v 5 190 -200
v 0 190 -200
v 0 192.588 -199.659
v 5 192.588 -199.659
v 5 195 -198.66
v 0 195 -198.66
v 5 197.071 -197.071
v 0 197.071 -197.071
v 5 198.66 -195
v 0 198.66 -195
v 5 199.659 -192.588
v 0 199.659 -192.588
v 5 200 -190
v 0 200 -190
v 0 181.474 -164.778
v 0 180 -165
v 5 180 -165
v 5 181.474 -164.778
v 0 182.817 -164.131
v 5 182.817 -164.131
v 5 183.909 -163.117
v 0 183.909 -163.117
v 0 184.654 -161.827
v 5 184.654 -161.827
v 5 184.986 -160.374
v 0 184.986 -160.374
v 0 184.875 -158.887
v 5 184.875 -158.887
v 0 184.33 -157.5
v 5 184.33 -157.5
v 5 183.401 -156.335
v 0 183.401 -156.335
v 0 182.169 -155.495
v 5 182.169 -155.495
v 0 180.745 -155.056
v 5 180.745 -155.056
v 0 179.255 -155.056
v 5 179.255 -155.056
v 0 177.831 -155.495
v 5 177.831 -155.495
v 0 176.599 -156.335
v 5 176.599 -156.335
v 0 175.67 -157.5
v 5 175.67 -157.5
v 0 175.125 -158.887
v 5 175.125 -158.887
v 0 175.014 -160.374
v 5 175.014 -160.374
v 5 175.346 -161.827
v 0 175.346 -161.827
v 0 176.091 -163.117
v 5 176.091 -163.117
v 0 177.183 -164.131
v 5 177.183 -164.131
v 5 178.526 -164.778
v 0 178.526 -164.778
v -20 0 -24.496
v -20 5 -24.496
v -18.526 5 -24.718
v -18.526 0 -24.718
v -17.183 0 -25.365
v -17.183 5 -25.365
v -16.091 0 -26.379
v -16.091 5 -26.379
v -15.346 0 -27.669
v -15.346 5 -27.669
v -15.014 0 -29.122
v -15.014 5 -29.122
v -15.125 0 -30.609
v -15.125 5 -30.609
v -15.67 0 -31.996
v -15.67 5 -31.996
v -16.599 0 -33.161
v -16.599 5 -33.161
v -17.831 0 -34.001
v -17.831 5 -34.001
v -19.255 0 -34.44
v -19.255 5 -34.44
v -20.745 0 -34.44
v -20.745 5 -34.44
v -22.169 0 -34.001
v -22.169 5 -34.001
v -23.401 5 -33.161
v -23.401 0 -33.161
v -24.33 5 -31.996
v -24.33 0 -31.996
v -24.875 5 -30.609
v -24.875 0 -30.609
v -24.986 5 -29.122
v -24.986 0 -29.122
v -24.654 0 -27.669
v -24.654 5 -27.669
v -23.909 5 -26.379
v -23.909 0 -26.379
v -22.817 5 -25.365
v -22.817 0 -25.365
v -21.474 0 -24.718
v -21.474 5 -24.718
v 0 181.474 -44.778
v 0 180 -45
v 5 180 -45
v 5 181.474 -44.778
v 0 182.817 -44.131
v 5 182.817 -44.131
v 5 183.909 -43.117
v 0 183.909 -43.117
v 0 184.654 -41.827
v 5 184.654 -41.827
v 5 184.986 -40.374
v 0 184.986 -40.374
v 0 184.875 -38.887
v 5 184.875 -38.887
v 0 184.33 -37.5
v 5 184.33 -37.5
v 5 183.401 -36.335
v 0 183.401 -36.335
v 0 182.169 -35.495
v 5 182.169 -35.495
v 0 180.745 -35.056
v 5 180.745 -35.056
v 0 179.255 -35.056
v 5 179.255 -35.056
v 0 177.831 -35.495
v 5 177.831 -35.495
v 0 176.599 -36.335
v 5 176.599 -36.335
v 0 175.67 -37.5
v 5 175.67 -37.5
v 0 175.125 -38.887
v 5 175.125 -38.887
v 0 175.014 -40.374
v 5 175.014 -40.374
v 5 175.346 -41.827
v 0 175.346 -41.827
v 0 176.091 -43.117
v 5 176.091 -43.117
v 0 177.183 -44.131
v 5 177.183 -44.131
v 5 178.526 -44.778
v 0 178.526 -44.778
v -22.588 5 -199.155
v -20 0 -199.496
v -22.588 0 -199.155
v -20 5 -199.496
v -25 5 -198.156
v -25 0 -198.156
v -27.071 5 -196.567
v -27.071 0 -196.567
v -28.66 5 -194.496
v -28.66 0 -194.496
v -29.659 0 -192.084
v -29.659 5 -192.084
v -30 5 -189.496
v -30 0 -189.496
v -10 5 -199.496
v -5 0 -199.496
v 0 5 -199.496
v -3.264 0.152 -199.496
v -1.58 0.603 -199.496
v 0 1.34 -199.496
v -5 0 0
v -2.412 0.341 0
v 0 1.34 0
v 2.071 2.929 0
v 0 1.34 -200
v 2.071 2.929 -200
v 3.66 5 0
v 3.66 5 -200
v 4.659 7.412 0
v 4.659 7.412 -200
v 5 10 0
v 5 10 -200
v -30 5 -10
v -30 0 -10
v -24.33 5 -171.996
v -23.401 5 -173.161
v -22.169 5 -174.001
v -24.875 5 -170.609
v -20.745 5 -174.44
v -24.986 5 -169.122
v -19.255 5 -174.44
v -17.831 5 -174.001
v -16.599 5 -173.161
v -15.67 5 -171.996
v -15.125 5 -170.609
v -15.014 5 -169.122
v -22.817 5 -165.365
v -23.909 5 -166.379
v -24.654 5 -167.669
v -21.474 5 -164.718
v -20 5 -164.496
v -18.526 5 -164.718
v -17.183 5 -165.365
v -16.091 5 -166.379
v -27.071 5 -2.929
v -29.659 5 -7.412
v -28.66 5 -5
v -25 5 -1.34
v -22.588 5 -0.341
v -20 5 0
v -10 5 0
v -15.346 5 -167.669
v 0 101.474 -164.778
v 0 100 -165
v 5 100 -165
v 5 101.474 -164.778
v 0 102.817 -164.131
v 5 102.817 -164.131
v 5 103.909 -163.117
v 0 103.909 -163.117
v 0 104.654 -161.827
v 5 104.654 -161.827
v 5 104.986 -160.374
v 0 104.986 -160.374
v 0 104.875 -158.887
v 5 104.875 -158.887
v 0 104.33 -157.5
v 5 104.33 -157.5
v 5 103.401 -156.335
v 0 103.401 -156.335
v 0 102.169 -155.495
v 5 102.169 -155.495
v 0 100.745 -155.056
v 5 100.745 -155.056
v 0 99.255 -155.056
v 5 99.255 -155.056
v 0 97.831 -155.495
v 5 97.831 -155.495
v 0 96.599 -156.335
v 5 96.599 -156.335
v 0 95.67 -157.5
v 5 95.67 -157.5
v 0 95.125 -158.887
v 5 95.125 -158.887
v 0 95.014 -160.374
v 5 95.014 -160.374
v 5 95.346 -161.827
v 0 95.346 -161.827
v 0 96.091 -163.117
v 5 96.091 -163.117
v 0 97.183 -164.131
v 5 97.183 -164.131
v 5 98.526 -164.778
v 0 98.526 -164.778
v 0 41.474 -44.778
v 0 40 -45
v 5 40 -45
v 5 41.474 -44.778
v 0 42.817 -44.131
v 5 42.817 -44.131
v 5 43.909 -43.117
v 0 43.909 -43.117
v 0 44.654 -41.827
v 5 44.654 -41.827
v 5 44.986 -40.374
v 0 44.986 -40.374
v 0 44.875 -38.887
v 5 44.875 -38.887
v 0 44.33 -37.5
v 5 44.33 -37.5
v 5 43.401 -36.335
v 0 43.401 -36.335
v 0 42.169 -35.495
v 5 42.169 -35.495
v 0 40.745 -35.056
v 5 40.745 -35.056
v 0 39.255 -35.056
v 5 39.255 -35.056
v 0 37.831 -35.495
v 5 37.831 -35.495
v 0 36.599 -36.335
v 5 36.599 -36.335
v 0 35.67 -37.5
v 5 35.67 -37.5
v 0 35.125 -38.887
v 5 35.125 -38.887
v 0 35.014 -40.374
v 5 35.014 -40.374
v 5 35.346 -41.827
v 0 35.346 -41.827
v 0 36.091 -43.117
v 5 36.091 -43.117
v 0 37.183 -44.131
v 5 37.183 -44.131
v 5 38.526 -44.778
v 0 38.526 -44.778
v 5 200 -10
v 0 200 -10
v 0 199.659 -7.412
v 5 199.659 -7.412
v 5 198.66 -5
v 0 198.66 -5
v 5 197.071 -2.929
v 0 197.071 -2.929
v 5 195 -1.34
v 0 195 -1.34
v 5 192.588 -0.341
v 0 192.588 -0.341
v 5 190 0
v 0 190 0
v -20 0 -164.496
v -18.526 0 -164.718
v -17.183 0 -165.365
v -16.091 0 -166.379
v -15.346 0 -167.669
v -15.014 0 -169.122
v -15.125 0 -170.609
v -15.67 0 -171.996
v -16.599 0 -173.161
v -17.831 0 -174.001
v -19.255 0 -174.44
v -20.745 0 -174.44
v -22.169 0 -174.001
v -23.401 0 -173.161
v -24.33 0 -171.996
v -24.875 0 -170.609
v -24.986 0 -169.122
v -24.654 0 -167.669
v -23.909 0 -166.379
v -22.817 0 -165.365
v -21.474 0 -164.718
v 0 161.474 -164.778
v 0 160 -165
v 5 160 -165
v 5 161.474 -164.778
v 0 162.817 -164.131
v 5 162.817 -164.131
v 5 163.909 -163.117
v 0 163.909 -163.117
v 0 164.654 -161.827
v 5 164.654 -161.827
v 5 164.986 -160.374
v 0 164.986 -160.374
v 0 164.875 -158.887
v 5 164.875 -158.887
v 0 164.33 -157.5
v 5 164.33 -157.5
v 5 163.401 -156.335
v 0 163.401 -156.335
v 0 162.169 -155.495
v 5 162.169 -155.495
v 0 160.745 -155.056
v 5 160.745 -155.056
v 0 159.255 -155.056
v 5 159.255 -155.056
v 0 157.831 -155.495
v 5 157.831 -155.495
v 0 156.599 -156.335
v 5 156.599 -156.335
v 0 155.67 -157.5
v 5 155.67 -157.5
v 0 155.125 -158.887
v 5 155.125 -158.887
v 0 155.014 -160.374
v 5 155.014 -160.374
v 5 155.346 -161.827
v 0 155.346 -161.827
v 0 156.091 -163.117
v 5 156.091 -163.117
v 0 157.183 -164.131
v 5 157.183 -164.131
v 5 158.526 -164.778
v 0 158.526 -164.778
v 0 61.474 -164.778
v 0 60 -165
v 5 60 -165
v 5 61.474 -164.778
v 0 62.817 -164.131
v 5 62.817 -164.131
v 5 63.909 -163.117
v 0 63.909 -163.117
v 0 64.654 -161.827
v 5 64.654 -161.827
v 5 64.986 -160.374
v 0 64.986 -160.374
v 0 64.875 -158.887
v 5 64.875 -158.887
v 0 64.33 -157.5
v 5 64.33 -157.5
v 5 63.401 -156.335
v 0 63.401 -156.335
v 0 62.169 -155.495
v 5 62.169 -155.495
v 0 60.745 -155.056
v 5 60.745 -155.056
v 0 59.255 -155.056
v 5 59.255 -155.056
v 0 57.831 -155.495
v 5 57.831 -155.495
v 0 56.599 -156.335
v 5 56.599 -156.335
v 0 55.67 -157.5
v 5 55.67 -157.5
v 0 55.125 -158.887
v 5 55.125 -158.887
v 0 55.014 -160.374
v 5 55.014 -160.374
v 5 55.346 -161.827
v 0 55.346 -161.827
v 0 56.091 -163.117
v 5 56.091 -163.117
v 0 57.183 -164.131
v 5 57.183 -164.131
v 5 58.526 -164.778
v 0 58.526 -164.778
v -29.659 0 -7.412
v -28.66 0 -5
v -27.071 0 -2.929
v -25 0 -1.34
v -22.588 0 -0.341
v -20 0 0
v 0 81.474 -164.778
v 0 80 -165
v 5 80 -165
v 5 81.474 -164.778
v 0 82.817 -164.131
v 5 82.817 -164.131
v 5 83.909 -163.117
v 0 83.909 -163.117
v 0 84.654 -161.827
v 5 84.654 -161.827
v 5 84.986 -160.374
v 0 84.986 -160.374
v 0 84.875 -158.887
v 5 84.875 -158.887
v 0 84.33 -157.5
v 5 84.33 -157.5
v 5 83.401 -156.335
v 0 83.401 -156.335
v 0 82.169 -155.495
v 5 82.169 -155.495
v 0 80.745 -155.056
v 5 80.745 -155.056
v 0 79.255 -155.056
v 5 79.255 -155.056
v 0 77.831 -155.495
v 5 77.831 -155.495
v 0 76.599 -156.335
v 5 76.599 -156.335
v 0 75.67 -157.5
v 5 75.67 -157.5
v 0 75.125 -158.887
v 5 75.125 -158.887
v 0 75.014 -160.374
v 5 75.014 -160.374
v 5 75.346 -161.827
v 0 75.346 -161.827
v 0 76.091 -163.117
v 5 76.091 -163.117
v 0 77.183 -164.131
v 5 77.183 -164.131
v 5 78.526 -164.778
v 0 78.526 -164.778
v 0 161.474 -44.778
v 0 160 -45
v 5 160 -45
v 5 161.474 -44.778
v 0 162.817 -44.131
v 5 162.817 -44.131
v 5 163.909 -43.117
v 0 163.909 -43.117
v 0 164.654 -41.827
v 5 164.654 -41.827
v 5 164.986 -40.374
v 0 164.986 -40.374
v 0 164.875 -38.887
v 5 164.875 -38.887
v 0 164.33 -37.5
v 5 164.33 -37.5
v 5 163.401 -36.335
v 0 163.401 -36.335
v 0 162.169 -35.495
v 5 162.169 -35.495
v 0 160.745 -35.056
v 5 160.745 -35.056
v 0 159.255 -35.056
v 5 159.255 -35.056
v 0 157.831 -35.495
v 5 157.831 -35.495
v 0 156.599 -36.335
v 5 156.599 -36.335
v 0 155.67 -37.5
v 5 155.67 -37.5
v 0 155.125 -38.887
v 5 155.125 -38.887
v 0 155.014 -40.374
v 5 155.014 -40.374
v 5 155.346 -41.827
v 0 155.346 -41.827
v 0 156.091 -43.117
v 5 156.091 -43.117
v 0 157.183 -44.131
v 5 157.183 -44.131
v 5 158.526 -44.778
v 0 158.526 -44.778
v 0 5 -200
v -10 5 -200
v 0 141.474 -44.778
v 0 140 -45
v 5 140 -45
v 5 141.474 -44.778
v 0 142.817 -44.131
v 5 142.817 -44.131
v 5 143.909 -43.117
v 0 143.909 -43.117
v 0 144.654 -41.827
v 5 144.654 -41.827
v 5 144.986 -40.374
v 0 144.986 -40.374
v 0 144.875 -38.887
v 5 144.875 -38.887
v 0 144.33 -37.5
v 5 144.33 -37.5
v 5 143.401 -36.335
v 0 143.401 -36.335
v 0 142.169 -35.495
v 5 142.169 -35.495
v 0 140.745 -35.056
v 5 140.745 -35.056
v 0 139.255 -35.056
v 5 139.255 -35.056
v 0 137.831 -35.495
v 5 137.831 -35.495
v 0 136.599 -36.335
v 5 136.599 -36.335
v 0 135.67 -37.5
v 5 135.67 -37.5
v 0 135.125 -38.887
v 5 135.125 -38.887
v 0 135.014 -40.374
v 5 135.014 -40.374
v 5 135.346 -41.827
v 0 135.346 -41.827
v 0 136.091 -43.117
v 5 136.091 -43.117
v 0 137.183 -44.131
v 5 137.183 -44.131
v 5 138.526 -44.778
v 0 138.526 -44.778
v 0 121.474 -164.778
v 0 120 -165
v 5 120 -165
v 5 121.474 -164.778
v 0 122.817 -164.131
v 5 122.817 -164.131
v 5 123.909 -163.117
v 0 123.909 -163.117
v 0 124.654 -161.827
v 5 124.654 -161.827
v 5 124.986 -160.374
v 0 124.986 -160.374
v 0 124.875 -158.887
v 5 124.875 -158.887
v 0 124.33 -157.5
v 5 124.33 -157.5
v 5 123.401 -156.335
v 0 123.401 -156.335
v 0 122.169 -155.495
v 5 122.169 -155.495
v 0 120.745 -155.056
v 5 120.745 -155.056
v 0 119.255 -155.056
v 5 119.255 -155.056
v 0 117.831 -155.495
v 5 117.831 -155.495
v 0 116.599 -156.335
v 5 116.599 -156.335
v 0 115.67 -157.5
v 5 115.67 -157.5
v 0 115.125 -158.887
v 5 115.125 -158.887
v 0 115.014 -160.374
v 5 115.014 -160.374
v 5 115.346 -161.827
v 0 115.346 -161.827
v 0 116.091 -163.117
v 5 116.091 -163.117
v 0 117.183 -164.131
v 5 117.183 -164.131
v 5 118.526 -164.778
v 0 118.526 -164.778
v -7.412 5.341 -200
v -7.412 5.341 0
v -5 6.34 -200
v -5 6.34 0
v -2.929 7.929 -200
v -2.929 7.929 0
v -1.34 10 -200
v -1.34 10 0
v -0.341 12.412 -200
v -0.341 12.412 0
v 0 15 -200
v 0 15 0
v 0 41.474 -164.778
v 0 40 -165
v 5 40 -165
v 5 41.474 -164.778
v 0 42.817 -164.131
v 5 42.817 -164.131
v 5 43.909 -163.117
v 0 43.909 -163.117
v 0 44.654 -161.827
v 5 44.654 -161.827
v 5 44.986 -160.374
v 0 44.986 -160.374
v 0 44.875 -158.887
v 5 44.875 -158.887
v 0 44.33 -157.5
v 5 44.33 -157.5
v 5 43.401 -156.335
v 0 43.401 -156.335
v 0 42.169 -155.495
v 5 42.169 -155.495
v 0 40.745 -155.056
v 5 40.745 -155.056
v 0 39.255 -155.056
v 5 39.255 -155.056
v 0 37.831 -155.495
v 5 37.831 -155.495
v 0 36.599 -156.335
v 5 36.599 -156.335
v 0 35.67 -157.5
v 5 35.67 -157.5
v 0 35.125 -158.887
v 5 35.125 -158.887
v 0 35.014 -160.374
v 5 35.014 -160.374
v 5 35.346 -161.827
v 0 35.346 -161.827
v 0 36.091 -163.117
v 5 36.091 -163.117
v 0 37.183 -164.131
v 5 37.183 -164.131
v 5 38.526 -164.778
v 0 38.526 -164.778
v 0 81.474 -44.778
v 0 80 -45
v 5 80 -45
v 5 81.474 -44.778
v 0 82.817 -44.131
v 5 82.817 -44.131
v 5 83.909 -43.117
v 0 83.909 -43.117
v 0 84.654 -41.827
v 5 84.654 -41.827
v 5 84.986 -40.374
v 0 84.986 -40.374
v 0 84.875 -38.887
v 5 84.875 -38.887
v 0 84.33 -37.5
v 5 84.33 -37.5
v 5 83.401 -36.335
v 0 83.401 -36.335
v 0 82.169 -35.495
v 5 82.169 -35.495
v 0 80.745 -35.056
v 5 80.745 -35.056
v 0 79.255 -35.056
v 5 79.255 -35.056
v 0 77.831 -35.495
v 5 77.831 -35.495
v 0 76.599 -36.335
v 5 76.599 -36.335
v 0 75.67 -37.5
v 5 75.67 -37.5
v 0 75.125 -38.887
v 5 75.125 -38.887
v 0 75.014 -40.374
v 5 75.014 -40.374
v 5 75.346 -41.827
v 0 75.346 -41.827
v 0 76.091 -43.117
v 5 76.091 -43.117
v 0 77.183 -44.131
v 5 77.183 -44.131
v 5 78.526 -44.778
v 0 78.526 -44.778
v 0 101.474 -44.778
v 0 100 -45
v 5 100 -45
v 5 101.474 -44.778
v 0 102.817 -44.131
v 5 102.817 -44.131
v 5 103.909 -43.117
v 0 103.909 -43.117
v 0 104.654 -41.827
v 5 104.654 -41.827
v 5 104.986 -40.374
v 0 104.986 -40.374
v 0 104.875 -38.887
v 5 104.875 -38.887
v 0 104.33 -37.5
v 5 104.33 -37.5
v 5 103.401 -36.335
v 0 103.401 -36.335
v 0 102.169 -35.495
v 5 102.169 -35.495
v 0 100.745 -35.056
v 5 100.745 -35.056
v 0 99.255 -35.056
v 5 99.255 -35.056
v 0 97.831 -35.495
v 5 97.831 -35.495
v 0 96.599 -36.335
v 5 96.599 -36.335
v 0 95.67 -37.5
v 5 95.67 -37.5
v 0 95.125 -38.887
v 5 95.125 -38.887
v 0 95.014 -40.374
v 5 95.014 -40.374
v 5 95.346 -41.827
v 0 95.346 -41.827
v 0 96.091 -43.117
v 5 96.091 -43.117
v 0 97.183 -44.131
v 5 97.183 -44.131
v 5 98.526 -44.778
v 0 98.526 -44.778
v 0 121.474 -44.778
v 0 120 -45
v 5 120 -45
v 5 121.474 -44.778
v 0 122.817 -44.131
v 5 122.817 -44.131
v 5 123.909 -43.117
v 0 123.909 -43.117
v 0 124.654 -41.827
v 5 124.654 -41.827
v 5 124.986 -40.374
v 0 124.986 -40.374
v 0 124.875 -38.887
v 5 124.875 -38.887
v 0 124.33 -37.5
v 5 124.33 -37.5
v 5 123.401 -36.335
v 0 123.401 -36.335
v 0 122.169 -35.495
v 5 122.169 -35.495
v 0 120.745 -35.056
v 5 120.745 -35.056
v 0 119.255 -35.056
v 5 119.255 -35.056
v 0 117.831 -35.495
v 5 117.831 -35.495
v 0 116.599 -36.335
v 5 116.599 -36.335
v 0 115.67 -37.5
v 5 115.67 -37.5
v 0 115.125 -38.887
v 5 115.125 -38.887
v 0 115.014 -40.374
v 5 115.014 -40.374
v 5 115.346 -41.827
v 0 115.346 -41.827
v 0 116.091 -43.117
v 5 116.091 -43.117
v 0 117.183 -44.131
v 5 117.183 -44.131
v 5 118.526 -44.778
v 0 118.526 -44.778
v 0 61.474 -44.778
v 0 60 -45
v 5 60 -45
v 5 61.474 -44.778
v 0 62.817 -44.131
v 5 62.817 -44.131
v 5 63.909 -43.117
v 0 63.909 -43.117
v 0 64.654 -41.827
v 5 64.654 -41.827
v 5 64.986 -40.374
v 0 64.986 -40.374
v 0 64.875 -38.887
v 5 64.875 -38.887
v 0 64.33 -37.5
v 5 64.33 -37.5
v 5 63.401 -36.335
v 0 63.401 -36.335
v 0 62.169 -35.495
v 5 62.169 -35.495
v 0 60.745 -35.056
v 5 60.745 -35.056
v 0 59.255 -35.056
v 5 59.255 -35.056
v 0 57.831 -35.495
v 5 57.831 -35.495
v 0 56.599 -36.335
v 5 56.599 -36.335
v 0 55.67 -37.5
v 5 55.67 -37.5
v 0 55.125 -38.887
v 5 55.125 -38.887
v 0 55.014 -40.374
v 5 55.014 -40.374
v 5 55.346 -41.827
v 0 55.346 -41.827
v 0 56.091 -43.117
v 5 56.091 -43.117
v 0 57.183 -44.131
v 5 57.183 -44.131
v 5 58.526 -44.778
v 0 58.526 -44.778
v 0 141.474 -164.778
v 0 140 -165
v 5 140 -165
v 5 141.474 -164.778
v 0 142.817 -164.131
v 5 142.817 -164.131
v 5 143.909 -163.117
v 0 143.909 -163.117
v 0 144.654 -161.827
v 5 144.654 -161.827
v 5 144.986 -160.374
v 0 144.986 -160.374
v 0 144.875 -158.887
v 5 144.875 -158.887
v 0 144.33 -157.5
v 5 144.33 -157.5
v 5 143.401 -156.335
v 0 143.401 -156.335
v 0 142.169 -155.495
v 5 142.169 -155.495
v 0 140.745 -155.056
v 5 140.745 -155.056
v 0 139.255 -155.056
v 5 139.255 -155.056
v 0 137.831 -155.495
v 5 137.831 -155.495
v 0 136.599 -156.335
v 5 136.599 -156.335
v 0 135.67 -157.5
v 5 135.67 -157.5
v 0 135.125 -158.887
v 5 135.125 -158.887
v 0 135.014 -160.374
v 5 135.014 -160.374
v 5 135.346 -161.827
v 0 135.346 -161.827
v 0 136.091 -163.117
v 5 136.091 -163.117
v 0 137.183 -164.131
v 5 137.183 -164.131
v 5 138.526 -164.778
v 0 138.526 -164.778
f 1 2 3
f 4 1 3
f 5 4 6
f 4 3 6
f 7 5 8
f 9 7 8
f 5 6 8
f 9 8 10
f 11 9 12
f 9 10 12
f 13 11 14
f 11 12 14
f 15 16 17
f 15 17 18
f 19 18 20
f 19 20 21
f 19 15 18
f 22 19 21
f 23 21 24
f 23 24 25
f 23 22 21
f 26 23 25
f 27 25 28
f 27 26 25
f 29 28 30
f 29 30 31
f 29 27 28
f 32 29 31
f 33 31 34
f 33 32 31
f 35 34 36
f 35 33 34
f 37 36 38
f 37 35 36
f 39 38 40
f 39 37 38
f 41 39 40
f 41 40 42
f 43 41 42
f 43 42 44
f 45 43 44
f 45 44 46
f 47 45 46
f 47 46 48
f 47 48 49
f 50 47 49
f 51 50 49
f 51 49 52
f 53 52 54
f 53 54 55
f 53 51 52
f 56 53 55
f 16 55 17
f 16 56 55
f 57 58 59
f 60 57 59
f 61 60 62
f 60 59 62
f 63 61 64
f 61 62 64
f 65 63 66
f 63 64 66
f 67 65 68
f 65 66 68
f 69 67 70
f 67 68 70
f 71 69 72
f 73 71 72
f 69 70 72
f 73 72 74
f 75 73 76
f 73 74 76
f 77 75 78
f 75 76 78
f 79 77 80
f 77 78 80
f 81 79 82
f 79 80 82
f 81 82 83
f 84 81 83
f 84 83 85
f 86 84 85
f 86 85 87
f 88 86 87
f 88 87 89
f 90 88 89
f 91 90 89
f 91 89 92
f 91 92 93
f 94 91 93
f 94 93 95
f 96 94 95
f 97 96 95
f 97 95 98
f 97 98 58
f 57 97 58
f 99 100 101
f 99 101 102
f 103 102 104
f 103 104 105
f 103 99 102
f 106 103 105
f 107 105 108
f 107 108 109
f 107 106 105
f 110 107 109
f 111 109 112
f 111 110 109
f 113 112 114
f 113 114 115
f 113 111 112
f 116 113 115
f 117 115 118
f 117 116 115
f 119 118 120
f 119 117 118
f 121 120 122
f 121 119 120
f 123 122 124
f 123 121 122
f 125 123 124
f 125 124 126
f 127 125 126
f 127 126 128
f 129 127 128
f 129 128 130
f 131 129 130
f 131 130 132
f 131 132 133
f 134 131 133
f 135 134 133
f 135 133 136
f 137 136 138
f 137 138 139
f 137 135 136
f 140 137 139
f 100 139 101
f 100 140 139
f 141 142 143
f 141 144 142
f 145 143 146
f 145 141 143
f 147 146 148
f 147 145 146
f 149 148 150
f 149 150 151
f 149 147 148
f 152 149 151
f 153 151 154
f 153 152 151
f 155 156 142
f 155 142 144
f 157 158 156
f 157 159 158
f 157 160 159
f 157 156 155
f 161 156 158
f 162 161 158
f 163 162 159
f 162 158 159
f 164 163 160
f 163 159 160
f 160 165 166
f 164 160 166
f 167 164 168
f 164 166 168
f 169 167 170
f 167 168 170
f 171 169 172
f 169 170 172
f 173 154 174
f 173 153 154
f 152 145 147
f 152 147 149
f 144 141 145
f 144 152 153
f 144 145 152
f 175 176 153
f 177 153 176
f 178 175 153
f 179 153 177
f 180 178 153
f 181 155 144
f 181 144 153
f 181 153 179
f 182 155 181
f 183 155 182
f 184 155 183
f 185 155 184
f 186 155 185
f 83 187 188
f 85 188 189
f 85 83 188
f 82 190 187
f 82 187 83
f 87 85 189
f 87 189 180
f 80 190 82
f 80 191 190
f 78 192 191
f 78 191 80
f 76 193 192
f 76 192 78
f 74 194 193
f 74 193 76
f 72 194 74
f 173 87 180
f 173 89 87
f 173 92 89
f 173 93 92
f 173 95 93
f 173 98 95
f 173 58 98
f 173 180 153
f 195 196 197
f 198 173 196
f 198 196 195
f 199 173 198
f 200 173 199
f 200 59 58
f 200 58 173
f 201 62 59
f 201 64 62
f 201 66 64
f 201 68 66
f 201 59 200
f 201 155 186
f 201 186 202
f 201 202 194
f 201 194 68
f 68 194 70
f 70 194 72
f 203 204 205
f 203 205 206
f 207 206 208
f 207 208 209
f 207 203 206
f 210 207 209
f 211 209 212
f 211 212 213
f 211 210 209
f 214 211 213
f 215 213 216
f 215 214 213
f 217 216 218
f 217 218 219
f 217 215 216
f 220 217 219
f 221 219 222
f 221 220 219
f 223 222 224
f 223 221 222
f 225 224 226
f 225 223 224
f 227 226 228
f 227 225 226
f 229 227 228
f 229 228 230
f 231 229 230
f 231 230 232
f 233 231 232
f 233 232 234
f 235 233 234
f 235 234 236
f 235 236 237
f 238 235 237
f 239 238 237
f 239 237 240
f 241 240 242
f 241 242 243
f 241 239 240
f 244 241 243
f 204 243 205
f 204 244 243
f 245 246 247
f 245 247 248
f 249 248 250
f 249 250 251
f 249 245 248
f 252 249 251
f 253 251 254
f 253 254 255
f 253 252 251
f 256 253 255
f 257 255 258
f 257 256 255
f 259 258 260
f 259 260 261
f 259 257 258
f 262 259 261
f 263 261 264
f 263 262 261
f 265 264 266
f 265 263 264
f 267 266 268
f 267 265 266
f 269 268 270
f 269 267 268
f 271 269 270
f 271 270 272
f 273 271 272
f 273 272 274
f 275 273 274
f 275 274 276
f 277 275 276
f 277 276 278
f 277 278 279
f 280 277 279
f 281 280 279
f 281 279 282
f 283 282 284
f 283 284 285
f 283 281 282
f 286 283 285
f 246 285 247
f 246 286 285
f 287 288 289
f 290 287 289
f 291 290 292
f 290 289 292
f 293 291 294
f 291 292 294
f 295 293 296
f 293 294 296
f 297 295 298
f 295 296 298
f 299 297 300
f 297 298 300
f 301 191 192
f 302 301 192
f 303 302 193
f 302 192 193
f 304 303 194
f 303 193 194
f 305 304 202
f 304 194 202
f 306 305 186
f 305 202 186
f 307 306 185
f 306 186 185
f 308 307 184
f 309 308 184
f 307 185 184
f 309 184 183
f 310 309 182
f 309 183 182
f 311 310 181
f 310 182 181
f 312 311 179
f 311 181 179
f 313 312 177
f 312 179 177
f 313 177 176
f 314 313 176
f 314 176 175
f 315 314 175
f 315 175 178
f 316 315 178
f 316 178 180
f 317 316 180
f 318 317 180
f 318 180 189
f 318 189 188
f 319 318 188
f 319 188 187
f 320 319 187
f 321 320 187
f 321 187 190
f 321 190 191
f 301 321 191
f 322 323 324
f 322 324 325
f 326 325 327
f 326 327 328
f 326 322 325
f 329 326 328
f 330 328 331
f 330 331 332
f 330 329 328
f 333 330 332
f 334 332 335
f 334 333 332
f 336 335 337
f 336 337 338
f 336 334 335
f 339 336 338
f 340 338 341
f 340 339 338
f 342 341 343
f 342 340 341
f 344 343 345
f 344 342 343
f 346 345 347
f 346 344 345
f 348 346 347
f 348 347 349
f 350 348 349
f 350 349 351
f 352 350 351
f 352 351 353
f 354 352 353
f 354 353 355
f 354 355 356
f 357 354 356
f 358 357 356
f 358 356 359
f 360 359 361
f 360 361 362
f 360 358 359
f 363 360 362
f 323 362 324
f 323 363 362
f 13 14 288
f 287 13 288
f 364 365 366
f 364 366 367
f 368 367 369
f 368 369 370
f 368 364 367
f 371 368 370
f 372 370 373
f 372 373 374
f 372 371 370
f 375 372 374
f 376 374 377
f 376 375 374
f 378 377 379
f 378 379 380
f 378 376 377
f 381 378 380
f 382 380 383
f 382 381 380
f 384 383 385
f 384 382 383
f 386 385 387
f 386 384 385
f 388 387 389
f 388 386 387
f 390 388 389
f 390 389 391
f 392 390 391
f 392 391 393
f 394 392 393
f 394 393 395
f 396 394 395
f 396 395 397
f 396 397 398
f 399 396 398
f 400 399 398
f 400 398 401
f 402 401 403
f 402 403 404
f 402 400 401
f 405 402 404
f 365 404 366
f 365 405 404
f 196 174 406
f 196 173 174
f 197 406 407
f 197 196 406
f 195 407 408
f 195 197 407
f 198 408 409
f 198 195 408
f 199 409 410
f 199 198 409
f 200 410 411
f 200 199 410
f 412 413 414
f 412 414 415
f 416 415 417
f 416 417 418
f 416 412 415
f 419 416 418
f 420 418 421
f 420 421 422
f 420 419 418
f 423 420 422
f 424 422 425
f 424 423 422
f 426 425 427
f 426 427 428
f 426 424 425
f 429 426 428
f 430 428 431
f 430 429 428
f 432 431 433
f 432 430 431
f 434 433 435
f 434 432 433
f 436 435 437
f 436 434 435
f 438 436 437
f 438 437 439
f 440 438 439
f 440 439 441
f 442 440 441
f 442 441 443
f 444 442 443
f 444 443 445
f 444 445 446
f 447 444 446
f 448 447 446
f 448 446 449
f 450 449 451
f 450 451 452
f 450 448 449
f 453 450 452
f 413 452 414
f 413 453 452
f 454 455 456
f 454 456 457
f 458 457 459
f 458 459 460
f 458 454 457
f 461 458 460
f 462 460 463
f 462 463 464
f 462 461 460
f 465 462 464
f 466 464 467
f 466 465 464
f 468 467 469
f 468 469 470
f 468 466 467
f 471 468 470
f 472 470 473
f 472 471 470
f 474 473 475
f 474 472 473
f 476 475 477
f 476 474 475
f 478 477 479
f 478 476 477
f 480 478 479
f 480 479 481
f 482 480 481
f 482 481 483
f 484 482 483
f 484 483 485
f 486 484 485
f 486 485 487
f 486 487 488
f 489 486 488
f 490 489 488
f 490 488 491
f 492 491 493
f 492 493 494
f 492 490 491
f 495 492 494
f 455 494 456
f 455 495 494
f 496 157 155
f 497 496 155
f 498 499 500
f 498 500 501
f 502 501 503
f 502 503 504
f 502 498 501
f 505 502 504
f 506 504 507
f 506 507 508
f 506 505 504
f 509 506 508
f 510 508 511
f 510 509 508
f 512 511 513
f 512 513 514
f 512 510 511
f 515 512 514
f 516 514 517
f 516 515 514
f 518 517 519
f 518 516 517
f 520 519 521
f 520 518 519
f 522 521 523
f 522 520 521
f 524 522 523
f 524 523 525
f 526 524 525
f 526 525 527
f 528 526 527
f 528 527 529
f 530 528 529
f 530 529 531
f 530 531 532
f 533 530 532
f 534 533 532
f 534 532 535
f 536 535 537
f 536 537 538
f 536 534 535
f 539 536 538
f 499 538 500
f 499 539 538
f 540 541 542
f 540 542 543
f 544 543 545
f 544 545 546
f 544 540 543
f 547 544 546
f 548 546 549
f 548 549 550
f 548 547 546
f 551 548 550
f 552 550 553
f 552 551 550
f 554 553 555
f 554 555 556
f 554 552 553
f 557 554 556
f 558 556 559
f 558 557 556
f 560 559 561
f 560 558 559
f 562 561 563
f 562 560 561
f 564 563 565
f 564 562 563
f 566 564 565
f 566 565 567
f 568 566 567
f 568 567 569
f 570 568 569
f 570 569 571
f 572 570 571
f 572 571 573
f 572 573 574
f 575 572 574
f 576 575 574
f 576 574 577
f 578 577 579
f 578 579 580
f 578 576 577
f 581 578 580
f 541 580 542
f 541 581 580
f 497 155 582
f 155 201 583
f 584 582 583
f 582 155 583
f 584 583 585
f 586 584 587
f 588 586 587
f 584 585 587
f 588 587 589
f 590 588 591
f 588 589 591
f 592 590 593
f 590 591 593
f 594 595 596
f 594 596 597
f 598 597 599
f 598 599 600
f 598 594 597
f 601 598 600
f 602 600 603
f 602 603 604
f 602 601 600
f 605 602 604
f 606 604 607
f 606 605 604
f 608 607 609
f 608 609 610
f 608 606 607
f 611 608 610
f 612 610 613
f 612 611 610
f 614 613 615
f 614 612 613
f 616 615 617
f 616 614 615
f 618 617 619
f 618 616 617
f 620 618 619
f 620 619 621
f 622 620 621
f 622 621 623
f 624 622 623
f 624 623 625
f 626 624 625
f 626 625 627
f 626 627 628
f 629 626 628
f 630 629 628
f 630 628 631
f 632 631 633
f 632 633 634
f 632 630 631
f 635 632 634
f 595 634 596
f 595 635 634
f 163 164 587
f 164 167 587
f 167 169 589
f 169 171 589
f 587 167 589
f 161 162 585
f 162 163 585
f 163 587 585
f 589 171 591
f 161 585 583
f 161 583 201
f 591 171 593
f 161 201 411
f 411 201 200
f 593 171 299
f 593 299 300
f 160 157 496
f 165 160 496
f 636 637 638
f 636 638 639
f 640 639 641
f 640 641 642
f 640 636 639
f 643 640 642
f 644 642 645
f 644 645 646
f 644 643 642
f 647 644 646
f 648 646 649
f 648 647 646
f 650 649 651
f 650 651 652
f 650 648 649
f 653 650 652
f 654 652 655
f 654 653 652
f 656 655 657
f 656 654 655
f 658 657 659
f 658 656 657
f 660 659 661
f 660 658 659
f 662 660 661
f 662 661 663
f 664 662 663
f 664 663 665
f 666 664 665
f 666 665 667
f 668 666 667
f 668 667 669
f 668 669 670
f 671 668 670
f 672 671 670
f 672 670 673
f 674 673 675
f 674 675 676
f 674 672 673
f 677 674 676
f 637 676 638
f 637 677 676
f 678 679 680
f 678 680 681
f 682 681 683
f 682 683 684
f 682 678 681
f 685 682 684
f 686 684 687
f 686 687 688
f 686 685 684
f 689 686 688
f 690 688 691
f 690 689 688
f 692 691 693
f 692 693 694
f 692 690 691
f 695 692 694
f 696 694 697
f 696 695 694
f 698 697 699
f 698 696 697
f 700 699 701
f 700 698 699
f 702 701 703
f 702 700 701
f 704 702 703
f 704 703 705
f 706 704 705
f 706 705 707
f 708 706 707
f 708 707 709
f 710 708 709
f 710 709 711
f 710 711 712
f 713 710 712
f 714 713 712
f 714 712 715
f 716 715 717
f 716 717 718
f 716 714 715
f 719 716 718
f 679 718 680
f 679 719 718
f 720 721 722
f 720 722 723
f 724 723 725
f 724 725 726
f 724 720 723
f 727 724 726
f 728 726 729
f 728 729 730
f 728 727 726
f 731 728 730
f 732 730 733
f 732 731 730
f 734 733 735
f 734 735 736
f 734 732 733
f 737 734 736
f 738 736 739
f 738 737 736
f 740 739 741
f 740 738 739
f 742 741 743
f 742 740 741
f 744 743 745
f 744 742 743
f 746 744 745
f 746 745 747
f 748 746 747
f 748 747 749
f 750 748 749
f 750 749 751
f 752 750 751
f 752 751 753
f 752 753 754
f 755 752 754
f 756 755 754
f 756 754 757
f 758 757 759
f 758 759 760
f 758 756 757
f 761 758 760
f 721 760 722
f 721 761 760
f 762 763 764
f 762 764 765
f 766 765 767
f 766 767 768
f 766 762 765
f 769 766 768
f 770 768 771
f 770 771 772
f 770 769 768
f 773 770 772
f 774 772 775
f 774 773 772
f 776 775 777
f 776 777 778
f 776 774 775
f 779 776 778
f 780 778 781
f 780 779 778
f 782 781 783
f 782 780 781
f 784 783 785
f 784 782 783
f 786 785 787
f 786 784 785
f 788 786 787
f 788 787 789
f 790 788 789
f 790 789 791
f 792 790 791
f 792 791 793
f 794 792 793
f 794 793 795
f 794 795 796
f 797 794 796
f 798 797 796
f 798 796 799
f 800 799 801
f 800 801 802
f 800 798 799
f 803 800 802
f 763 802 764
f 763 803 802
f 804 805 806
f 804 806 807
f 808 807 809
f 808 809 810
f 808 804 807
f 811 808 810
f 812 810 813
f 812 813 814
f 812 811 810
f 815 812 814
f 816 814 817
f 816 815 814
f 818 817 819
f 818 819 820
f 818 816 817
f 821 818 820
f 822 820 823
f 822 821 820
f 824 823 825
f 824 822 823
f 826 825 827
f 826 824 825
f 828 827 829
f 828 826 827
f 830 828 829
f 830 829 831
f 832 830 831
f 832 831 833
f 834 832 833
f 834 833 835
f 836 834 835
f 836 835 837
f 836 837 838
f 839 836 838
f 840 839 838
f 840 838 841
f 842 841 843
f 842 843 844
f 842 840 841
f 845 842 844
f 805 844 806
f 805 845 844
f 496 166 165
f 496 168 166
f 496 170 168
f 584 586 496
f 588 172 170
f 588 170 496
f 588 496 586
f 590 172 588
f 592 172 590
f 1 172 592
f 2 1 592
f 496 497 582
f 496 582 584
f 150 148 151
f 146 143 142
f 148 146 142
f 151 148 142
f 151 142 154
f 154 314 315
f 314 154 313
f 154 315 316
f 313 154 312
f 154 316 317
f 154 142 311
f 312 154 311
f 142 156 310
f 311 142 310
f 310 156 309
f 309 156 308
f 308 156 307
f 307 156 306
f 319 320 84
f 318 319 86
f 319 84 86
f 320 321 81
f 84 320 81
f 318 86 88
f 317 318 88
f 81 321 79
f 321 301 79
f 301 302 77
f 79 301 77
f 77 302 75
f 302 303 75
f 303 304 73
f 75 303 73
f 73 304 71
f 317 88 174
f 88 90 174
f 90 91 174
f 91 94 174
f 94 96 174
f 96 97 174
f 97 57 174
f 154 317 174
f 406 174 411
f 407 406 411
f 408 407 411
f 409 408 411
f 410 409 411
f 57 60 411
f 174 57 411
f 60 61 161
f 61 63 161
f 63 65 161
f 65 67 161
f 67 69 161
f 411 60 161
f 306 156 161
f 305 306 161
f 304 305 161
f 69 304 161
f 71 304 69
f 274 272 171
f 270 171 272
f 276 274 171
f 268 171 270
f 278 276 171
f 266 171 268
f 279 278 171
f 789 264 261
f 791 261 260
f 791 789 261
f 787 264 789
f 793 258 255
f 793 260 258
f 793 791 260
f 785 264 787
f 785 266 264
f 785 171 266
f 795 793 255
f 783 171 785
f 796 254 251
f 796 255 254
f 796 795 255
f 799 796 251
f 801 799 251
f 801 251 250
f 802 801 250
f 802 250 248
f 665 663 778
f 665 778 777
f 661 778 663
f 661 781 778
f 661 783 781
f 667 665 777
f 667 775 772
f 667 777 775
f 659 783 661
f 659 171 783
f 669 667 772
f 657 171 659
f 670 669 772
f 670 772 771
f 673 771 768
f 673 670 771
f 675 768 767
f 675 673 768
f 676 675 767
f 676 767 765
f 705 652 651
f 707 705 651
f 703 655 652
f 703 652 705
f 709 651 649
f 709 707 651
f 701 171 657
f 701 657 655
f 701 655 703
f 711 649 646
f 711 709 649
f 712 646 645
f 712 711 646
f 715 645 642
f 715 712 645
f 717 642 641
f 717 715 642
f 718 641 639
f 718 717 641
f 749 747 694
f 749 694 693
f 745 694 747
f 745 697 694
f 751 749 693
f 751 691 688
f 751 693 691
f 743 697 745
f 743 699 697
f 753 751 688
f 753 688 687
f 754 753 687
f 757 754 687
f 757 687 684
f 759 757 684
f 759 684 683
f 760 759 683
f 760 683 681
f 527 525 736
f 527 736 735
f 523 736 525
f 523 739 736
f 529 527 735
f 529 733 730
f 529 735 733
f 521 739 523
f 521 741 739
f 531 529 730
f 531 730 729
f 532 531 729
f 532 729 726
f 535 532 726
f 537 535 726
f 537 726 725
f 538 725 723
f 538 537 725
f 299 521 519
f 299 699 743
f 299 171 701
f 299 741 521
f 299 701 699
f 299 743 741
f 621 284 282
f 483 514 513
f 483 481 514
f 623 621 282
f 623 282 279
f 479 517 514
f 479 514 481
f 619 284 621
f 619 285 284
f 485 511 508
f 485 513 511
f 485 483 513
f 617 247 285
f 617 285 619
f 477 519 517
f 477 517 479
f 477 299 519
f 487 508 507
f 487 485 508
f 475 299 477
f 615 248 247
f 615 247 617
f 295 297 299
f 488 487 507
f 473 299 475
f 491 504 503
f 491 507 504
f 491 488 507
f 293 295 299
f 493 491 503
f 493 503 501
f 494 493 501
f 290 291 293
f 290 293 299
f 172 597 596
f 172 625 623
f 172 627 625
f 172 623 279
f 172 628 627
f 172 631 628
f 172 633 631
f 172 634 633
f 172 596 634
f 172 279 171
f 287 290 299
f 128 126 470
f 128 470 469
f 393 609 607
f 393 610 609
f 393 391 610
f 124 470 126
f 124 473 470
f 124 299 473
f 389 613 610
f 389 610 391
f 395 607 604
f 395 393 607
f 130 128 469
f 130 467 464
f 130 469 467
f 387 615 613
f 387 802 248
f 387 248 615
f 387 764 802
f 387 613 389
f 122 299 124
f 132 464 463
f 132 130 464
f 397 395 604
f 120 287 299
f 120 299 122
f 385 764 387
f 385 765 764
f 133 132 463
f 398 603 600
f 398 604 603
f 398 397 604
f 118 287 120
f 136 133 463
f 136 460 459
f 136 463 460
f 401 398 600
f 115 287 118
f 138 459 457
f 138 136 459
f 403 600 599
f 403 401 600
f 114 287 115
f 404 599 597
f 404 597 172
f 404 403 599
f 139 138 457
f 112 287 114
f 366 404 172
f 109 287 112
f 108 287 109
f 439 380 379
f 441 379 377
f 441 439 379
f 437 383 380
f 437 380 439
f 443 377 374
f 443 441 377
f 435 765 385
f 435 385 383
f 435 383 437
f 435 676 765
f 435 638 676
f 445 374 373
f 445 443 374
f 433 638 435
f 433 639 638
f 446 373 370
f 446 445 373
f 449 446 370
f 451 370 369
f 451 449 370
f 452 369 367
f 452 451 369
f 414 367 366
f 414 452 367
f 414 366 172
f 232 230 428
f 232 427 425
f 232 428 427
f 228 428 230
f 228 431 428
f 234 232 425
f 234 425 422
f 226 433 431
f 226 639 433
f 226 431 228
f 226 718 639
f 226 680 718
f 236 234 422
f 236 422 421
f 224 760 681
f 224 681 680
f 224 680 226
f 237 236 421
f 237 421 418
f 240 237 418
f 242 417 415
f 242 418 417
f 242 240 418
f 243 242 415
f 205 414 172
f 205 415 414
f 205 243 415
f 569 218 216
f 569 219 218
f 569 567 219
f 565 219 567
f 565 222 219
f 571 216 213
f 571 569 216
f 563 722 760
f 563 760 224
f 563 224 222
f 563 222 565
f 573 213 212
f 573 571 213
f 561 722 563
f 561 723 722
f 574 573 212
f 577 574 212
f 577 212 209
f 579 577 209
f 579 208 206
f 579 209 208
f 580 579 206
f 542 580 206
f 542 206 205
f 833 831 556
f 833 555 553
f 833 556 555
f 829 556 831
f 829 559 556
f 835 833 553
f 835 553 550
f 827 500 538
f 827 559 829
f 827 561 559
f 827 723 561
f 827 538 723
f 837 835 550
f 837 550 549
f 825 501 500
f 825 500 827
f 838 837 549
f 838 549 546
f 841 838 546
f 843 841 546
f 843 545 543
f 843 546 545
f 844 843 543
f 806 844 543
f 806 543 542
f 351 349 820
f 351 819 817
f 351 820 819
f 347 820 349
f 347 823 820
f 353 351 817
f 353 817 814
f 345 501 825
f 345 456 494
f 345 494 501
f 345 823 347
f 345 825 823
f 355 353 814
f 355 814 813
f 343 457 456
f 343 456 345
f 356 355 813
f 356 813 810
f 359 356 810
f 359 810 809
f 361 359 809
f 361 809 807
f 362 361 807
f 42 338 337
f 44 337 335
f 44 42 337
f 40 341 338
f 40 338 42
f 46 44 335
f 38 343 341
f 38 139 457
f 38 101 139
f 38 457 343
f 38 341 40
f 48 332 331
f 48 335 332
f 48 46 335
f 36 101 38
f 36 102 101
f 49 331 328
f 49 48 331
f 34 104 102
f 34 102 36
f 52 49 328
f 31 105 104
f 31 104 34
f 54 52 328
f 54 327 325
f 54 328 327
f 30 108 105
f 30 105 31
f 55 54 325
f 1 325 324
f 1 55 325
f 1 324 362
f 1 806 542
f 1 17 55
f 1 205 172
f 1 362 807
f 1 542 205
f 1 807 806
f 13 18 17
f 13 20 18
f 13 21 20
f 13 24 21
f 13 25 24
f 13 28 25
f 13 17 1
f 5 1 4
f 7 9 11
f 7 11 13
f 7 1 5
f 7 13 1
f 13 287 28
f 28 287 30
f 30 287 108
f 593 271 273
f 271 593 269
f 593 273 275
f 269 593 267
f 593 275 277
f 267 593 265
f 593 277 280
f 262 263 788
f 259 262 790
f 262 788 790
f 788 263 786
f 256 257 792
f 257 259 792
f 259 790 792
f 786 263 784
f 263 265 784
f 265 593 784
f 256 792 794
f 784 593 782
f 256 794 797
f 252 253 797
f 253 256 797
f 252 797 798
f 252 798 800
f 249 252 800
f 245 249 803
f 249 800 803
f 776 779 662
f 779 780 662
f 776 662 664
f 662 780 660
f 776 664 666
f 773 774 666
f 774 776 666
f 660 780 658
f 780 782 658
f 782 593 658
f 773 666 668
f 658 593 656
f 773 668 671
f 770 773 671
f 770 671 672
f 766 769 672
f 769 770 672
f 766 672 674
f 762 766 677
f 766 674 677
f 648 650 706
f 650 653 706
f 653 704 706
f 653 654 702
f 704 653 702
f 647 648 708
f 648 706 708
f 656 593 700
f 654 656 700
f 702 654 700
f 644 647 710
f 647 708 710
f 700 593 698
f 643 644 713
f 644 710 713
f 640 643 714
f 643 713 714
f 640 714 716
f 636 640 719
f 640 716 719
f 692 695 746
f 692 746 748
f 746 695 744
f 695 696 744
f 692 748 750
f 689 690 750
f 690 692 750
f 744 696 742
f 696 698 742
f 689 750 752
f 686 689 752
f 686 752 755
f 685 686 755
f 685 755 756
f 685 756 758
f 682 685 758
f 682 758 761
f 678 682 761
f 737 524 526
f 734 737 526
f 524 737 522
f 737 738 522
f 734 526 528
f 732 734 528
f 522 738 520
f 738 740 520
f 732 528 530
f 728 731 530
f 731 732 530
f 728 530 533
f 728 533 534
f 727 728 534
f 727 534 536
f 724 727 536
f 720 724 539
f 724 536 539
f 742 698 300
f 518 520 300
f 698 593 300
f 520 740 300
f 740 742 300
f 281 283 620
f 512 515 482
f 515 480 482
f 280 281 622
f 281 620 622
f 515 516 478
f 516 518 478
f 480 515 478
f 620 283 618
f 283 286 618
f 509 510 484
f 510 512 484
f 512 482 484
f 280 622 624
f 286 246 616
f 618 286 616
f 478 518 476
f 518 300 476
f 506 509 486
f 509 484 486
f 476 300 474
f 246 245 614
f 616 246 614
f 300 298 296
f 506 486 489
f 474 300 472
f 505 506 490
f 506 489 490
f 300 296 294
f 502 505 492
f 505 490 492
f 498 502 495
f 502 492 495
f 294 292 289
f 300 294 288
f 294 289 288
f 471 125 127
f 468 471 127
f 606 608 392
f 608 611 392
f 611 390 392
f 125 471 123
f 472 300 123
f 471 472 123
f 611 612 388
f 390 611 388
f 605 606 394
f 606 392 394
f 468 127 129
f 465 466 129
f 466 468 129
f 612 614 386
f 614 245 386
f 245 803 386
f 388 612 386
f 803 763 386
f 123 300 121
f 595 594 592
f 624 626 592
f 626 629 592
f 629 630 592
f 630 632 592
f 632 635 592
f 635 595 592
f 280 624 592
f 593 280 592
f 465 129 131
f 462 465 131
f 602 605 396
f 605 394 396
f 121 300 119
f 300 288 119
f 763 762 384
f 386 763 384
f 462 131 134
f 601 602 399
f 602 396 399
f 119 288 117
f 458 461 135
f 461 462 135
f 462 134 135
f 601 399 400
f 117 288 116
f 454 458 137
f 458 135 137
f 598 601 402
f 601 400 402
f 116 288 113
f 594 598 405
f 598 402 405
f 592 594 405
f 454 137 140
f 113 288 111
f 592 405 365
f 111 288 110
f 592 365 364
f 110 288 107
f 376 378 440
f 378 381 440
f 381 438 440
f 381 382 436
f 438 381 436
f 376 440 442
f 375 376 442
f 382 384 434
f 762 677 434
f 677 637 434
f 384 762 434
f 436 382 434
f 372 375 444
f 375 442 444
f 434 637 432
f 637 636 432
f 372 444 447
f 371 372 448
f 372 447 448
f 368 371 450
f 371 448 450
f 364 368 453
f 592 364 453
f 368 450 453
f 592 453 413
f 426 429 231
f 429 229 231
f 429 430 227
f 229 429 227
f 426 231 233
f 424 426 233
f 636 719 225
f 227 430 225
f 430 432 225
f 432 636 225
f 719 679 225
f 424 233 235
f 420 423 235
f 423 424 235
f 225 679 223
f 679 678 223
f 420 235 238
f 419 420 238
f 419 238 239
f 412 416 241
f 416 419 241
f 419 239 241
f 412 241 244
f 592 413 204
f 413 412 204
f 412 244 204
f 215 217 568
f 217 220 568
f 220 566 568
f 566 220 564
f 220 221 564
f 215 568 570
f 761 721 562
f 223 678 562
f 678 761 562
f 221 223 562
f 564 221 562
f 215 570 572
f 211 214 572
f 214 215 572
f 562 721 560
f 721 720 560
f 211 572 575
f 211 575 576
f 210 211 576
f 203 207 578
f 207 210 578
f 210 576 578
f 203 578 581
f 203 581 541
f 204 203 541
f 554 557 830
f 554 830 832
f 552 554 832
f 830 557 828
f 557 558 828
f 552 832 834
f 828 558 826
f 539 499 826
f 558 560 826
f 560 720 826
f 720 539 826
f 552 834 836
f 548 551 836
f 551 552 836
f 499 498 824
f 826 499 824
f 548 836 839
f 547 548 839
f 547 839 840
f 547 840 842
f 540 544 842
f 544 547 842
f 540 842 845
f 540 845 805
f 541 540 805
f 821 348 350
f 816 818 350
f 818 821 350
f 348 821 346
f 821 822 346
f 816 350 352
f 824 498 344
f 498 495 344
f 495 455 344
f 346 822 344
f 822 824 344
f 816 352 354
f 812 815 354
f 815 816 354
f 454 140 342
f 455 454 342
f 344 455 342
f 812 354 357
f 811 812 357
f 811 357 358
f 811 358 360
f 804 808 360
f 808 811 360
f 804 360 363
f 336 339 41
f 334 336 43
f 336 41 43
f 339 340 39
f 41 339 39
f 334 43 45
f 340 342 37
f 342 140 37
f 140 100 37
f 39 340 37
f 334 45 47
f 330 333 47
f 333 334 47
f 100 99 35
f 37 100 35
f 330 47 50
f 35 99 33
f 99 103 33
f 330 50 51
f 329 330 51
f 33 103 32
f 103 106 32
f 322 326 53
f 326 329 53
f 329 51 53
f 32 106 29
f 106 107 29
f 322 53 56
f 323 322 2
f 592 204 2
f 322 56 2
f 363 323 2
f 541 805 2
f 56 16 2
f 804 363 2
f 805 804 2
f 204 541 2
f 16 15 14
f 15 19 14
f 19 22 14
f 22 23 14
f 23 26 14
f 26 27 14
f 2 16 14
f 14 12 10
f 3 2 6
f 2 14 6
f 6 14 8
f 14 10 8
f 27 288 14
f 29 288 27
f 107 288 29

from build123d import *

# Parameters (mm, degrees)
SKETCH1_R           = 5
BOSS_EXTRUDE1_DEPTH = 5
SKETCH3_W           = 199.496057237
SKETCH3_H           = 5
BOSS_EXTRUDE2_DEPTH = 30
FILLET1_R           = 10
BOSS_EXTRUDE3_DEPTH = 200
FILLET2_R           = 10
SKETCH8_R           = 5
CUT_EXTRUDE1_DEPTH  = 200


with BuildPart() as part:
    # Sketch1 → Boss-Extrude1 (new body)
    with BuildSketch(Plane(origin=(0, 0, 0), x_dir=(0, 0, -1), z_dir=(1, 0, 0))):
        with BuildLine():
            Line((0, 0), (200, 0))
            Line((200, 0), (200, 190))
            ThreePointArc((200, 190), (197.071067812, 197.071067812), (190, 200))
            Line((190, 200), (10, 200))
            ThreePointArc((10, 200), (2.928932188, 197.071067812), (0, 190))
            Line((0, 190), (0, 0))
        make_face()
        with Locations((40, 40)):
            Circle(SKETCH1_R, mode=Mode.SUBTRACT)
        with Locations((40, 60)):
            Circle(SKETCH1_R, mode=Mode.SUBTRACT)
        with Locations((40, 80)):
            Circle(SKETCH1_R, mode=Mode.SUBTRACT)
        with Locations((40, 100)):
            Circle(SKETCH1_R, mode=Mode.SUBTRACT)
        with Locations((40, 120)):
            Circle(SKETCH1_R, mode=Mode.SUBTRACT)
        with Locations((40, 140)):
            Circle(SKETCH1_R, mode=Mode.SUBTRACT)
        with Locations((40, 160)):
            Circle(SKETCH1_R, mode=Mode.SUBTRACT)
        with Locations((40, 180)):
            Circle(SKETCH1_R, mode=Mode.SUBTRACT)
        with Locations((160, 180)):
            Circle(SKETCH1_R, mode=Mode.SUBTRACT)
        with Locations((160, 40)):
            Circle(SKETCH1_R, mode=Mode.SUBTRACT)
        with Locations((160, 80)):
            Circle(SKETCH1_R, mode=Mode.SUBTRACT)
        with Locations((160, 60)):
            Circle(SKETCH1_R, mode=Mode.SUBTRACT)
        with Locations((160, 100)):
            Circle(SKETCH1_R, mode=Mode.SUBTRACT)
        with Locations((160, 120)):
            Circle(SKETCH1_R, mode=Mode.SUBTRACT)
        with Locations((160, 140)):
            Circle(SKETCH1_R, mode=Mode.SUBTRACT)
        with Locations((160, 160)):
            Circle(SKETCH1_R, mode=Mode.SUBTRACT)
    extrude(amount=BOSS_EXTRUDE1_DEPTH)

    # Sketch3 → Boss-Extrude2 (add)
    with BuildSketch(Plane.ZY):
        with Locations((-99.748028619, 2.5)):
            Rectangle(SKETCH3_W, SKETCH3_H)
    extrude(amount=BOSS_EXTRUDE2_DEPTH)

    # Fillet1
    fillet1_edges = [part.edges().sort_by_distance(p)[0] for p in [
        (5, 0, -100),
    ]]
    fillet(fillet1_edges, radius=FILLET1_R)

    # Sketch7 → Boss-Extrude3 (add)
    with BuildSketch(Plane.XY):
        with BuildLine():
            Line((0, 15), (0, 5))
            Line((0, 5), (-10, 5))
            ThreePointArc((-10, 5), (-2.928932188, 7.928932188), (0, 15))
        make_face()
    extrude(amount=-BOSS_EXTRUDE3_DEPTH)

    # Fillet2
    fillet2_edges = [part.edges().sort_by_distance(p)[0] for p in [
        (-30, 2.5, -199.496057237),
        (-30, 2.5, 0),
    ]]
    fillet(fillet2_edges, radius=FILLET2_R)

    # Sketch8 → Cut-Extrude1 (cut)
    with BuildSketch(Plane(origin=(0, 5, 0), x_dir=(1, 0, 0), z_dir=(0, 1, 0))):
        with Locations(Location((-20, 169.496057237, 0), (0, 0, 270))):
            Circle(SKETCH8_R)
        with Locations(Location((-20, 29.496057237, 0), (0, 0, 270))):
            Circle(SKETCH8_R)
    extrude(amount=-CUT_EXTRUDE1_DEPTH, mode=Mode.SUBTRACT)


solid = part.part
